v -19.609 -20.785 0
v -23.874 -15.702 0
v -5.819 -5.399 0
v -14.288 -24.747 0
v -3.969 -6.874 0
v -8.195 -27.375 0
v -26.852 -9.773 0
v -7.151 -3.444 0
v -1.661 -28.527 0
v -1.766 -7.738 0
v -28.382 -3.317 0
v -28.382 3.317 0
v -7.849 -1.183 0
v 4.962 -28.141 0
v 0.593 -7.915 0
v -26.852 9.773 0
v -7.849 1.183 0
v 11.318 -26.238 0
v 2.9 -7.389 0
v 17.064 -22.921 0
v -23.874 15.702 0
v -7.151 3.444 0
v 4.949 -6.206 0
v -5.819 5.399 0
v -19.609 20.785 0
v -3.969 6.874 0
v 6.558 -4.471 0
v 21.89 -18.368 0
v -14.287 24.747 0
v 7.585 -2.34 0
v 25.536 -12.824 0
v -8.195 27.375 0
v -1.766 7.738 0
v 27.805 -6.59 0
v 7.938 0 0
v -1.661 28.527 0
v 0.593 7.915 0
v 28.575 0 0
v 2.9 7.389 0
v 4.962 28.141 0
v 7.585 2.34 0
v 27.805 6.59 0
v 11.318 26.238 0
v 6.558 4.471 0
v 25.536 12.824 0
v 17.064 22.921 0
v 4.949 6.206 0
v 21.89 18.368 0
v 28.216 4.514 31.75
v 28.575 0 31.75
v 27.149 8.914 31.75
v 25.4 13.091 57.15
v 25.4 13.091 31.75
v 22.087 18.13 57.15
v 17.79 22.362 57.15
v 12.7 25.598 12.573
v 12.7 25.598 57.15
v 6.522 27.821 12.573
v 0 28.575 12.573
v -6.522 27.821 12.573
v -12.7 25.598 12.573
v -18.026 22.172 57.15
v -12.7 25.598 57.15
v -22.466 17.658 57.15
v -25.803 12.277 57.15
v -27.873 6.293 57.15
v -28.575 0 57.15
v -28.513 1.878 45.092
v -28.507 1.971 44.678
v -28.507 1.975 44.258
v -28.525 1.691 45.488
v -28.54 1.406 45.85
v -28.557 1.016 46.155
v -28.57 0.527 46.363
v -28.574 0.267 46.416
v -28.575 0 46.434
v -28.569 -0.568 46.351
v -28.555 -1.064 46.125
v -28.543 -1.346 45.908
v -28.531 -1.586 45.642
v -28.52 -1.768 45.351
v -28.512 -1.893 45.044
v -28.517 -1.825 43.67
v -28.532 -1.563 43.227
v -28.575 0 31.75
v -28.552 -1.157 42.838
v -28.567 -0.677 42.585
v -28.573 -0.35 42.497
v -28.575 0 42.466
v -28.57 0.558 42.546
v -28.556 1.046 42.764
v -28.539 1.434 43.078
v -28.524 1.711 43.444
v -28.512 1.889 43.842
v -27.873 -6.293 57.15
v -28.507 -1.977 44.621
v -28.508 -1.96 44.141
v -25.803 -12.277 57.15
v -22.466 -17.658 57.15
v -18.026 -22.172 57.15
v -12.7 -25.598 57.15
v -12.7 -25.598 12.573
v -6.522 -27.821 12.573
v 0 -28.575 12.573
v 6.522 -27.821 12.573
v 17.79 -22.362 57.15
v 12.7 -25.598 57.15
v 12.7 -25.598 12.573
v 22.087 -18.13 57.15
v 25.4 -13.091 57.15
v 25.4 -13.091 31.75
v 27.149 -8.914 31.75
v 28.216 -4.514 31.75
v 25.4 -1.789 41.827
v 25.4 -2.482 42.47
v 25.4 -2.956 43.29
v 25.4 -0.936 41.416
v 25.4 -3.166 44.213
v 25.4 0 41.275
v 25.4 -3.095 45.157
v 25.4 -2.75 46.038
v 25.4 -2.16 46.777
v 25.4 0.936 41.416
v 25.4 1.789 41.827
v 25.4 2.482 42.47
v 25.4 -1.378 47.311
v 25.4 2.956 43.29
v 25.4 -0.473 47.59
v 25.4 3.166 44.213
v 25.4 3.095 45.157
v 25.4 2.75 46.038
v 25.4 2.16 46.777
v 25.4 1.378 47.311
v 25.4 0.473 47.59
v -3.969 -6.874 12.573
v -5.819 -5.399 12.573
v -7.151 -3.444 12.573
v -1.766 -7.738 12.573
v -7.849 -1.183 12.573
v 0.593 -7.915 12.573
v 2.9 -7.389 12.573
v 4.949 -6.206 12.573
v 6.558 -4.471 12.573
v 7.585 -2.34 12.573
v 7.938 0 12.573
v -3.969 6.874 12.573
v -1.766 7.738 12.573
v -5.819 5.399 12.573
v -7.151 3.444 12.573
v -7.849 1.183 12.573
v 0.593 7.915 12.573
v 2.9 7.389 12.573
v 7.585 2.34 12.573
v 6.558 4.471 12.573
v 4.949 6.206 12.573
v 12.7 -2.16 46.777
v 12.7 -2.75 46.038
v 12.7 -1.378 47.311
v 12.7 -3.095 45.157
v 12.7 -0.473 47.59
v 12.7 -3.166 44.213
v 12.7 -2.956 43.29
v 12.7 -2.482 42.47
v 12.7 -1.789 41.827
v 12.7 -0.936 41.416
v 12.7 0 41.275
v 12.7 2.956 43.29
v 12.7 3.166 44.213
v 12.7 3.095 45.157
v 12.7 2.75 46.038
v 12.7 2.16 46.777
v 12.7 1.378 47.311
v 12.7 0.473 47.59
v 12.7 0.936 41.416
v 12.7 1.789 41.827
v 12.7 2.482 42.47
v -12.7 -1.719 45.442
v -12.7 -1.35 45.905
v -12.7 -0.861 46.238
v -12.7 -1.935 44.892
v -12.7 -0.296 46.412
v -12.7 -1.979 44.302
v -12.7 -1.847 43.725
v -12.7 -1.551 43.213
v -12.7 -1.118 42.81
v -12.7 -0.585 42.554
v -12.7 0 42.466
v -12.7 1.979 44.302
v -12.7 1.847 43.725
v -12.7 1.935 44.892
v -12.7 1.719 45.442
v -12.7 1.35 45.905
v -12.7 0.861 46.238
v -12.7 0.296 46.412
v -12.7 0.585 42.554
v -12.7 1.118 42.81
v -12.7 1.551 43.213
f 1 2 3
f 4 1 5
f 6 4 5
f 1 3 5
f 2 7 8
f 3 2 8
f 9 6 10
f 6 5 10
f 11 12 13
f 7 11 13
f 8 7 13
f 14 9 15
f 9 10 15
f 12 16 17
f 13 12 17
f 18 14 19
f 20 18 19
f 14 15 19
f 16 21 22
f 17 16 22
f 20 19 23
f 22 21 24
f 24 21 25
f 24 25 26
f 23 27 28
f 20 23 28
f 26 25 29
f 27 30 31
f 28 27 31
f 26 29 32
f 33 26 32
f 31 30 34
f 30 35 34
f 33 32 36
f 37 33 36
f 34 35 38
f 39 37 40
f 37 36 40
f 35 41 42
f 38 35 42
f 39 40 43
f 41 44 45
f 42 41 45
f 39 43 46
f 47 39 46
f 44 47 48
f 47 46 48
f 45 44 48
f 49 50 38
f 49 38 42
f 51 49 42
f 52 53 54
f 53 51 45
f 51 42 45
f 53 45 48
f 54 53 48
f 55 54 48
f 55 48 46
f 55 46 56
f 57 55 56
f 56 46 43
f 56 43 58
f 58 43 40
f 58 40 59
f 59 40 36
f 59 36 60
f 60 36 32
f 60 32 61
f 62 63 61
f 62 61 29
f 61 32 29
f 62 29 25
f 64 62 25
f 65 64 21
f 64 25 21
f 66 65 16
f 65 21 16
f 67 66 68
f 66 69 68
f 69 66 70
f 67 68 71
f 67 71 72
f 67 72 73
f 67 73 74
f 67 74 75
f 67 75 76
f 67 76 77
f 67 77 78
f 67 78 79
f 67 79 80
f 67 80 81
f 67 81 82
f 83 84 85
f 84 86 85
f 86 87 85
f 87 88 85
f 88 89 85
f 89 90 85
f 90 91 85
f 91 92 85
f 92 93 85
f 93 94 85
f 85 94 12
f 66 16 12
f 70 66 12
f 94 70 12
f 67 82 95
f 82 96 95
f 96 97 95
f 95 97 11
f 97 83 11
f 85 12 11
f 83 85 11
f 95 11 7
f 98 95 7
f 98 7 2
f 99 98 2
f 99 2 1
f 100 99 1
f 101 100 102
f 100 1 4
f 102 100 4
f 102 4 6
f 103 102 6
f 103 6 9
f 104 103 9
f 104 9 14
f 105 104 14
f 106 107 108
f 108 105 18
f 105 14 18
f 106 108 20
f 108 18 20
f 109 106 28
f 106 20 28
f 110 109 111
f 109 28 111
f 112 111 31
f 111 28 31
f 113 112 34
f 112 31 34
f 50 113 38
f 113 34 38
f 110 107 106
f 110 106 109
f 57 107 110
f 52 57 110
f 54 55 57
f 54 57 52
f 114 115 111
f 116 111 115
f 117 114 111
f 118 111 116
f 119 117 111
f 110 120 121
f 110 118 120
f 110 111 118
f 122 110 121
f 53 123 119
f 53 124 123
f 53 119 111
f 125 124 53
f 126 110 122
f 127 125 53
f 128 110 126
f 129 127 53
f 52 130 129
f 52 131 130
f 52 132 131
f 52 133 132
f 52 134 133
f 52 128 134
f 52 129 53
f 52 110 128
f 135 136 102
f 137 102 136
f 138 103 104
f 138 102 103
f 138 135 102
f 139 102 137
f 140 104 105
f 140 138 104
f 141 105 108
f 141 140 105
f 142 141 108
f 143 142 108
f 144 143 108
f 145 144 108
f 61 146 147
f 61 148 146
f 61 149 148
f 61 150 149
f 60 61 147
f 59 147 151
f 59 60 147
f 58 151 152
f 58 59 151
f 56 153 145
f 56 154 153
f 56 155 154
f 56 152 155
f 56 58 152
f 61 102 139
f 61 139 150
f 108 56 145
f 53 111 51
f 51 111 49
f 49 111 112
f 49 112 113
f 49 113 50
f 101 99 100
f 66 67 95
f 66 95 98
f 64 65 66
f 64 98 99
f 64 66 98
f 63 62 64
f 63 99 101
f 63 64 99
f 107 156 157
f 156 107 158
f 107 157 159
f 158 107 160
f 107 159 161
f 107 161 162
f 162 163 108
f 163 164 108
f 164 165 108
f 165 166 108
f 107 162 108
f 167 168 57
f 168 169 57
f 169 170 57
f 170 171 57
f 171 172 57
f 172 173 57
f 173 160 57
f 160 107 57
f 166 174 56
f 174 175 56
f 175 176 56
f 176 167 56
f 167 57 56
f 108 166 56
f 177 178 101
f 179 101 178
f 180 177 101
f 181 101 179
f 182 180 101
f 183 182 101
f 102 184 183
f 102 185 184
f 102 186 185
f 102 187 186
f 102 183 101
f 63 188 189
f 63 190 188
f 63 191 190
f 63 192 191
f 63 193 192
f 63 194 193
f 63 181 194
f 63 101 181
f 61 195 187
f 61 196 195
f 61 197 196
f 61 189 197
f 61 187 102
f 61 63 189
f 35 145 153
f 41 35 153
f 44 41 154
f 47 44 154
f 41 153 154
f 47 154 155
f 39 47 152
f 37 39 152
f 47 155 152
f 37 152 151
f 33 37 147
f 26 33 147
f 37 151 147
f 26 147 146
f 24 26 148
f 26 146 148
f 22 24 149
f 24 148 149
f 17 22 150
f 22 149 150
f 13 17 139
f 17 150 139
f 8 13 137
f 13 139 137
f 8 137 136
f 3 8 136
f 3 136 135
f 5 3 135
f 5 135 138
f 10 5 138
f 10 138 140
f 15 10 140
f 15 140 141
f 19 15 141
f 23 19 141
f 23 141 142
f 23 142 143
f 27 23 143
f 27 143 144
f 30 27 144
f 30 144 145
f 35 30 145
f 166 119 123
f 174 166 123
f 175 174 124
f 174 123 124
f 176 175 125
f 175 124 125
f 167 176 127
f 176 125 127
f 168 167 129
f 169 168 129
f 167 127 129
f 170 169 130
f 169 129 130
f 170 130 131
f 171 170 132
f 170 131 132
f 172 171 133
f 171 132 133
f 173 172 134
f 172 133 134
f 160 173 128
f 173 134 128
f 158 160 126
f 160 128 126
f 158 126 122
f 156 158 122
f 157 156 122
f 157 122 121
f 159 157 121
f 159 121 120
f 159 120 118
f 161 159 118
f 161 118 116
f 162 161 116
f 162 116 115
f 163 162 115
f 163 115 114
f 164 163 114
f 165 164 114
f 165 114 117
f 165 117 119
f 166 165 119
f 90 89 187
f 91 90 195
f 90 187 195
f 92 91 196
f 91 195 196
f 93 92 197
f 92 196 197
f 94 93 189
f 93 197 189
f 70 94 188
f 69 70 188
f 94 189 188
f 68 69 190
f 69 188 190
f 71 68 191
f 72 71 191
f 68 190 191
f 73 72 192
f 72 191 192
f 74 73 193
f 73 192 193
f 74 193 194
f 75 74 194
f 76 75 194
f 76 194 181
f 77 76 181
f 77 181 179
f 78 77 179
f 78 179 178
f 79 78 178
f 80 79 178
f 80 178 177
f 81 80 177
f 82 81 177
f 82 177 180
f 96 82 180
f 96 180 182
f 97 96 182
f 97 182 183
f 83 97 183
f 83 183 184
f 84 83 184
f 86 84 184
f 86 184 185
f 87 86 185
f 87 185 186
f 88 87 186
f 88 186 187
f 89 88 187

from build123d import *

# Parameters (mm, degrees)
SKETCH1_R                   = 28.575
OD_DON_T_CARE_DEPTH         = 57.15
SKETCH3_W                   = 25.4
SKETCH3_H                   = 44.577
SLOT_DEPTH                  = 50.8
SKETCH4_R                   = 7.9375
F_5_8_THROUGH_HOLE_DEPTH    = 61.167850045
SKETCH5_OUTSIDE_W           = 78.948
SKETCH5_OUTSIDE_H           = 78.948
SKETCH5_OUTSIDE_W_2         = 53.975
SKETCH5_OUTSIDE_H_2         = 51.195336702
FLAT_SURFACE_DEPTH          = 25.4
SKETCH2_R                   = 3.175
F_1_4_THROUGH_HOLE_DEPTH    = 38.1
SKETCH7_R                   = 1.984375
F_10_32_THREADED_HOLE_DEPTH = 77.067593297


with BuildPart() as part:
    # Sketch1 → OD Don't Care (new body)
    with BuildSketch(Plane.XY):
        Circle(SKETCH1_R)
    extrude(amount=OD_DON_T_CARE_DEPTH)

    # Sketch3 → Slot (cut, symmetric)
    with BuildSketch(Plane(origin=(0, 0, 0), x_dir=(1, 0, 0), z_dir=(0, 1, 0))):
        with Locations((0, -34.8615)):
            Rectangle(SKETCH3_W, SKETCH3_H)
    extrude(amount=SLOT_DEPTH, both=True, mode=Mode.SUBTRACT)

    # Sketch4 → 5/8" Through Hole (cut, through all)
    with BuildSketch(Plane.XY.offset(12.573)):
        Circle(SKETCH4_R)
    extrude(amount=-F_5_8_THROUGH_HOLE_DEPTH, mode=Mode.SUBTRACT)

    # Sketch5 outside → Flat Surface (cut)
    with BuildSketch(Plane.XY.offset(57.15)):
        Rectangle(SKETCH5_OUTSIDE_W, SKETCH5_OUTSIDE_H)
        with Locations((-1.5875, 0)):
            Rectangle(SKETCH5_OUTSIDE_W_2, SKETCH5_OUTSIDE_H_2, mode=Mode.SUBTRACT)
    extrude(amount=-FLAT_SURFACE_DEPTH, mode=Mode.SUBTRACT)

    # Sketch2 → 1/4" Through Hole (cut)
    with BuildSketch(Plane(origin=(25.4, 0, 0), x_dir=(0, 0, -1), z_dir=(1, 0, 0))):
        with Locations((-44.45, 0)):
            Circle(SKETCH2_R)
    extrude(amount=-F_1_4_THROUGH_HOLE_DEPTH, mode=Mode.SUBTRACT)

    # Sketch7 → 10-32 Threaded Hole (cut, through all)
    with BuildSketch(Plane(origin=(-12.7, 0, 0), x_dir=(0, 0, -1), z_dir=(1, 0, 0))):
        with Locations((-44.45, 0)):
            Circle(SKETCH7_R)
    extrude(amount=-F_10_32_THREADED_HOLE_DEPTH, mode=Mode.SUBTRACT)


solid = part.part
